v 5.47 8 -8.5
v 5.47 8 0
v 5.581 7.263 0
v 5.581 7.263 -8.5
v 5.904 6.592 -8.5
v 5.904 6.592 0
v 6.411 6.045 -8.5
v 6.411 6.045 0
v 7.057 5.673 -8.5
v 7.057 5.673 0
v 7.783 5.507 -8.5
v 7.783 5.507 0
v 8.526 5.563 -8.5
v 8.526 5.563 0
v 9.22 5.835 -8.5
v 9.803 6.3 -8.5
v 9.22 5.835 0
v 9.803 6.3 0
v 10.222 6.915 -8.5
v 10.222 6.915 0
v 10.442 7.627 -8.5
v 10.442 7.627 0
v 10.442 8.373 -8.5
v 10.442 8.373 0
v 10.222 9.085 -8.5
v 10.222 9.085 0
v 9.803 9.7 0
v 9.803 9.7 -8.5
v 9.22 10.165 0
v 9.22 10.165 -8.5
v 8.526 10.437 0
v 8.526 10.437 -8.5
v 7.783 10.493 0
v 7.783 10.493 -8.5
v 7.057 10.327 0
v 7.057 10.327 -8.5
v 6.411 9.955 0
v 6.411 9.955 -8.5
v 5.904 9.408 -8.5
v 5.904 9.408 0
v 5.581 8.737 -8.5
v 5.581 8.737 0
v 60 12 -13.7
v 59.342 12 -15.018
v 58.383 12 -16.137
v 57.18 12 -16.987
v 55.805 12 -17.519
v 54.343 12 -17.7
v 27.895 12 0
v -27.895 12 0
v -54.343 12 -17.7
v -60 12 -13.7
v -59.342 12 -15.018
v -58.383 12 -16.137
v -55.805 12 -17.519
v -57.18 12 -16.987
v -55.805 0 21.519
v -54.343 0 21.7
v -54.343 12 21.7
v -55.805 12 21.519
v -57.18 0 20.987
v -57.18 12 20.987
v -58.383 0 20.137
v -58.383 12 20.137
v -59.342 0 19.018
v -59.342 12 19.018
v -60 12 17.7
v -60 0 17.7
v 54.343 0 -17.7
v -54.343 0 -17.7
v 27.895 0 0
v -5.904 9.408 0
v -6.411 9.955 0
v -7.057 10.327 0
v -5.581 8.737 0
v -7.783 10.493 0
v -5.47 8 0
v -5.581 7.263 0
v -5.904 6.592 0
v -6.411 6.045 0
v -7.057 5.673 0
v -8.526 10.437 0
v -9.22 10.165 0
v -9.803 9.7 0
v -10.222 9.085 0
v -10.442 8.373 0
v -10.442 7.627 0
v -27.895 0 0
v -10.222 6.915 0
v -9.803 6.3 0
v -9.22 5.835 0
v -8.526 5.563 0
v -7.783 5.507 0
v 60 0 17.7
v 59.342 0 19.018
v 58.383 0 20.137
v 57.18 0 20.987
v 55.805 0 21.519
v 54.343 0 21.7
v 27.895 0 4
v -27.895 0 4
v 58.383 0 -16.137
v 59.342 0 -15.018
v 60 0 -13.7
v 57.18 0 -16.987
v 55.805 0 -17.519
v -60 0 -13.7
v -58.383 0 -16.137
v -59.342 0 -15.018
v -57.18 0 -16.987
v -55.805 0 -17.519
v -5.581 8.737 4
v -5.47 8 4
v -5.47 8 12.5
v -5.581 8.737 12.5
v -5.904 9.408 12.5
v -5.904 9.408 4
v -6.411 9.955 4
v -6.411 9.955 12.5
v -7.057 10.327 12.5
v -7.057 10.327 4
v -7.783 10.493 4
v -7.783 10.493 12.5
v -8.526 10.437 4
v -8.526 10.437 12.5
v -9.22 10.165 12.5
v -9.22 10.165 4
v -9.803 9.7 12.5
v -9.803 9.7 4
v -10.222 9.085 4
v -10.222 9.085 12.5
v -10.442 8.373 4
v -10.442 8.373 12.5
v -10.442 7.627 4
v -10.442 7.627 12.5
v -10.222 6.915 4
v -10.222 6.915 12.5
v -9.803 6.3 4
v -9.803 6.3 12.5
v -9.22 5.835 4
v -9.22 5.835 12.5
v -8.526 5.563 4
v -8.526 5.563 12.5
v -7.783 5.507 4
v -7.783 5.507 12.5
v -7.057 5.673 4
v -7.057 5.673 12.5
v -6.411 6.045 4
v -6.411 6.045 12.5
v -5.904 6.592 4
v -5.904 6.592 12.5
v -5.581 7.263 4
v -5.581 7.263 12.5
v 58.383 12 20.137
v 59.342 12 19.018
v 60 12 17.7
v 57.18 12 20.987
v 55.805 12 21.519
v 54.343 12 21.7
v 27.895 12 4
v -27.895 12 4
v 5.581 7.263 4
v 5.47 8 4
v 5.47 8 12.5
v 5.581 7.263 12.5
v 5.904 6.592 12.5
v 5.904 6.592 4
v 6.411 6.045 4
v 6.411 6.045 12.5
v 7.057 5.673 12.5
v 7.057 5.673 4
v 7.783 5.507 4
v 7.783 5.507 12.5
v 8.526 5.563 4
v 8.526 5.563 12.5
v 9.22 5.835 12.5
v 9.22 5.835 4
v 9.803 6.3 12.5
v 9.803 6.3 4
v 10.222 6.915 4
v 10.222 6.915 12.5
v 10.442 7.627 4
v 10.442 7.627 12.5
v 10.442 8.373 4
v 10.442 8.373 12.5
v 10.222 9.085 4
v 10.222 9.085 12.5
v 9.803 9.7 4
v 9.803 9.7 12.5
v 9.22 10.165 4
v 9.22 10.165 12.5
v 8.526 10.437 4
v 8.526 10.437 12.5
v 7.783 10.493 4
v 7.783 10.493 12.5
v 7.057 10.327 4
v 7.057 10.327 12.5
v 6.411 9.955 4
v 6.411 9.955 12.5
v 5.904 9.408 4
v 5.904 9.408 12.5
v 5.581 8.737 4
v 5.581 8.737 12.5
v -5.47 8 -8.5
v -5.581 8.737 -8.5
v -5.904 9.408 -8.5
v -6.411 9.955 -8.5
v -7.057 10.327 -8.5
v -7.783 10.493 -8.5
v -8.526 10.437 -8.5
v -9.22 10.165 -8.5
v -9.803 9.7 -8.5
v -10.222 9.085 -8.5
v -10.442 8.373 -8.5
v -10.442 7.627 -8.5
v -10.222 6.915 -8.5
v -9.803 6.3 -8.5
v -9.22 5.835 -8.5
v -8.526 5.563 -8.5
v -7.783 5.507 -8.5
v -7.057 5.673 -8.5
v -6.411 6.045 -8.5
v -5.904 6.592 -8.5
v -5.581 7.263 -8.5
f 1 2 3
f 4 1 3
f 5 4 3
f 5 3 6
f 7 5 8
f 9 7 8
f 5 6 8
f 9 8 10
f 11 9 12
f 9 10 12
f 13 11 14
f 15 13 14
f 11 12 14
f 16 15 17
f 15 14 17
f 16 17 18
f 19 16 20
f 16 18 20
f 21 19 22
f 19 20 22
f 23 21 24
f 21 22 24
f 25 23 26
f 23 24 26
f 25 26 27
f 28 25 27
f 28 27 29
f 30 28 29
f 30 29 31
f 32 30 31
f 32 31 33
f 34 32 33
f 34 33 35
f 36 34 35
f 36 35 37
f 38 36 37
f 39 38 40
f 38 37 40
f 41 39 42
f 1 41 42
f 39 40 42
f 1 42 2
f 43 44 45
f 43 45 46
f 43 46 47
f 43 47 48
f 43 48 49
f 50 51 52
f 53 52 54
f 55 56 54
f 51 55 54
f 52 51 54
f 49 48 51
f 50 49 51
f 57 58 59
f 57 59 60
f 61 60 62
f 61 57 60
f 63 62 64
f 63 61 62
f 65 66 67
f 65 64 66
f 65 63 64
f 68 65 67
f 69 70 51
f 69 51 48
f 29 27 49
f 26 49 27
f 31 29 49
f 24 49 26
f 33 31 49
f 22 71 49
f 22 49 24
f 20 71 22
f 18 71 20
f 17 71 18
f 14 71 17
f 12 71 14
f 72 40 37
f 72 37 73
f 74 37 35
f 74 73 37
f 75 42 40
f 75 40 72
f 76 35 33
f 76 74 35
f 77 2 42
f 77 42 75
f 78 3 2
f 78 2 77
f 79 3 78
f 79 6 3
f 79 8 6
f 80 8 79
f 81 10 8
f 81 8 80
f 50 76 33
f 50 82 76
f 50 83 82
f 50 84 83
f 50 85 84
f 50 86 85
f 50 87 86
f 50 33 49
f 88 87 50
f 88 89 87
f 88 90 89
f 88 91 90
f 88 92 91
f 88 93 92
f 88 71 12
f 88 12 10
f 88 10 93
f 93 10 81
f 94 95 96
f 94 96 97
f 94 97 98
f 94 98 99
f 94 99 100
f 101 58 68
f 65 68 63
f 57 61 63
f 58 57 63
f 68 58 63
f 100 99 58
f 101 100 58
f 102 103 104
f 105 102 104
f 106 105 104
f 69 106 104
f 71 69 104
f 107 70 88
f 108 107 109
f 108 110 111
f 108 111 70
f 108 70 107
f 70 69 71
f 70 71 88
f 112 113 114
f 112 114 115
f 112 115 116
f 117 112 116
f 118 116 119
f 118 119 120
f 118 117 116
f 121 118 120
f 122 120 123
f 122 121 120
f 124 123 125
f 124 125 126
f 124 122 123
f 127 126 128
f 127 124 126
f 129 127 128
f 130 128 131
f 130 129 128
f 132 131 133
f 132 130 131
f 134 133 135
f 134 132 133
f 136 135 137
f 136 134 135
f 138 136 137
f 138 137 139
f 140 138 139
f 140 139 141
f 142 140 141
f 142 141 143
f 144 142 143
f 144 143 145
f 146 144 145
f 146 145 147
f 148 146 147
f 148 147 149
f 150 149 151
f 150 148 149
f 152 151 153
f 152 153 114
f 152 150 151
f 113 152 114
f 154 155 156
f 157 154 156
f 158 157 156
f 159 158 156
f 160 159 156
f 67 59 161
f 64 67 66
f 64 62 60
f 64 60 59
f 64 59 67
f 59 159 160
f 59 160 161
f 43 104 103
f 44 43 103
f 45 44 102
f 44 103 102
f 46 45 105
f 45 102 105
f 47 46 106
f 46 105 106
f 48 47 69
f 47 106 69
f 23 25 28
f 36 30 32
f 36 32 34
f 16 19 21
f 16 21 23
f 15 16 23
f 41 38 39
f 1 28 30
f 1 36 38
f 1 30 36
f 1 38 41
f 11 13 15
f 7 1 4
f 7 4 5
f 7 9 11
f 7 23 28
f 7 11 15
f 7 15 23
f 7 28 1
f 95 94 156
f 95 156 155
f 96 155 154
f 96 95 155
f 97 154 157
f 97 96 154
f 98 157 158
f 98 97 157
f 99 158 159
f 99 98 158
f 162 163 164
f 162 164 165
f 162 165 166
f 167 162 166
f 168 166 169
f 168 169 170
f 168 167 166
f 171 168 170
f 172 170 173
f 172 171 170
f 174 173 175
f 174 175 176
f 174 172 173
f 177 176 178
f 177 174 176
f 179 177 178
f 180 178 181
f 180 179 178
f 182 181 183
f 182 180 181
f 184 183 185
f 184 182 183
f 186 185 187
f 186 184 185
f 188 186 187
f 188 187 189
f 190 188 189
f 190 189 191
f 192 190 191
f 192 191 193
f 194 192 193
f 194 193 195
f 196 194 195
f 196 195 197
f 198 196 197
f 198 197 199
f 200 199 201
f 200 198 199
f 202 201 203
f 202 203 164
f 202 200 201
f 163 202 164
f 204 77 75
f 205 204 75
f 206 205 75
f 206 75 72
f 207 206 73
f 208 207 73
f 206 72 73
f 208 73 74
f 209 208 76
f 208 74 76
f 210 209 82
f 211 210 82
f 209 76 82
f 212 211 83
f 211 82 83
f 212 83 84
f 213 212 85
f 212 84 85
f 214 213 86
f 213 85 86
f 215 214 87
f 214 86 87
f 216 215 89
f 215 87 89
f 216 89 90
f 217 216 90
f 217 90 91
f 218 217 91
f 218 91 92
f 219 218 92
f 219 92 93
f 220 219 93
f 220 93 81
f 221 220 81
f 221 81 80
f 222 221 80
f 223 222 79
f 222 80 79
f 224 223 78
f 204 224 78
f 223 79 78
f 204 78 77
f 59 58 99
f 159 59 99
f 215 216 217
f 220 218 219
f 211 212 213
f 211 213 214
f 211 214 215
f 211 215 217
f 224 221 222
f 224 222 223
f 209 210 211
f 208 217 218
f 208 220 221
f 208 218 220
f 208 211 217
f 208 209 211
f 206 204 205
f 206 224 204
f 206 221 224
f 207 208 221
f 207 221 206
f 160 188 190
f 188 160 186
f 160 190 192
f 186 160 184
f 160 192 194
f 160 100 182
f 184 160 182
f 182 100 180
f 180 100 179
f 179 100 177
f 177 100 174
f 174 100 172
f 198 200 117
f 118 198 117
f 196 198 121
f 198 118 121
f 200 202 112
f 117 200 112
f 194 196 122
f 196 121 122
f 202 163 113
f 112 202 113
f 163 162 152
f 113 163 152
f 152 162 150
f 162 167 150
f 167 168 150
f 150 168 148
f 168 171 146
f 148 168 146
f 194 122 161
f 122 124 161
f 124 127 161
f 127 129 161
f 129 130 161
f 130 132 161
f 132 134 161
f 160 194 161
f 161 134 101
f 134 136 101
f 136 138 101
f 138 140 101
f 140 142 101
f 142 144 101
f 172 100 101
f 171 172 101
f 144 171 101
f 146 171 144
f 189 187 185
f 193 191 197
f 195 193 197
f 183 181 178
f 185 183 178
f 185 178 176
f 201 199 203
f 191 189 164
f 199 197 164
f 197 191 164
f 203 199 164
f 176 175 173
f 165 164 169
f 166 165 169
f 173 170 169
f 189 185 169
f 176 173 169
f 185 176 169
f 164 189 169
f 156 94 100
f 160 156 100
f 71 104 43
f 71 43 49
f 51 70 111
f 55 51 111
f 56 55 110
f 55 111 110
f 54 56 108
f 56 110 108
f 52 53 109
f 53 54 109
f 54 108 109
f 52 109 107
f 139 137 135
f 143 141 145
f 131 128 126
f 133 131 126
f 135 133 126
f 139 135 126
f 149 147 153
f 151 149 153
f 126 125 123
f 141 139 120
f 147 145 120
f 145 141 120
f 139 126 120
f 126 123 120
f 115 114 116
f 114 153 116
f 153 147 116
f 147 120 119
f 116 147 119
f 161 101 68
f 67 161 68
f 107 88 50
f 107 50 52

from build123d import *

# Parameters (mm, degrees)
BOSS_EXTRUDE1_DEPTH = 12
SKETCH3_R           = 2.5
CUT_EXTRUDE1_DEPTH  = 8.5
FILLET1_R           = 6


with BuildPart() as part:
    # Sketch1 → Boss-Extrude1 (new body)
    with BuildSketch(Plane(origin=(0, 0, 0), x_dir=(1, 0, 0), z_dir=(0, 1, 0))):
        Polygon((-60, 17.7), (60, 17.7), (60, 13.7), (27.895, 0), (-27.895, 0), (-60, 13.7), align=None)
    extrude(amount=BOSS_EXTRUDE1_DEPTH)

    # Sketch3 → Cut-Extrude1 (cut)
    with BuildSketch(Plane.XY):
        with Locations((-7.97, 8)):
            Circle(SKETCH3_R)
        with Locations(Location((7.97, 8, 0), (0, 0, 180))):
            Circle(SKETCH3_R)
    extrude(amount=-CUT_EXTRUDE1_DEPTH, mode=Mode.SUBTRACT)

    # Fillet1
    # the kernel refuses this fillet: 6 mm, written as the material it takes off along each edge
    with BuildSketch(Plane(origin=(60, -14.142135624, -17.7), x_dir=(-1, 0, 0), z_dir=(0, 1, 0))) as fillet1_piece_1:
        with BuildLine():
            CenterArc((5.656854249, 6), FILLET1_R, 199.471220634, 70.528779366)
            Line((0, 4), (-0.113137085, 3.96))
            ThreePointArc((-0.113137085, 3.96), (-0.12, 2), (-0.12, 0))
            Line((-0.12, 0), (0, -0.12))
            Line((0, -0.12), (5.656854249, -0.12))
            Line((5.656854249, -0.12), (5.656854249, 0))
        make_face()
    extrude(amount=40.284271247, mode=Mode.SUBTRACT)
    with BuildSketch(Plane(origin=(-60, -14.142135624, -17.7), x_dir=(1, 0, 0), z_dir=(0, 1, 0))) as fillet1_piece_2:
        with BuildLine():
            CenterArc((5.656854249, -6), FILLET1_R, 90, 70.528779366)
            Line((0, -4), (-0.113137085, -3.96))
            ThreePointArc((-0.113137085, -3.96), (-0.12, -2), (-0.12, 0))
            Line((-0.12, 0), (0, 0.12))
            Line((0, 0.12), (5.656854249, 0.12))
            Line((5.656854249, 0.12), (5.656854249, 0))
        make_face()
    extrude(amount=40.284271247, mode=Mode.SUBTRACT)


with BuildPart() as body_2:
    # Mirror2: mirrored copy
    add(part.part.mirror(Plane.XY.offset(2)))


solid = Compound([part.part, body_2.part])
